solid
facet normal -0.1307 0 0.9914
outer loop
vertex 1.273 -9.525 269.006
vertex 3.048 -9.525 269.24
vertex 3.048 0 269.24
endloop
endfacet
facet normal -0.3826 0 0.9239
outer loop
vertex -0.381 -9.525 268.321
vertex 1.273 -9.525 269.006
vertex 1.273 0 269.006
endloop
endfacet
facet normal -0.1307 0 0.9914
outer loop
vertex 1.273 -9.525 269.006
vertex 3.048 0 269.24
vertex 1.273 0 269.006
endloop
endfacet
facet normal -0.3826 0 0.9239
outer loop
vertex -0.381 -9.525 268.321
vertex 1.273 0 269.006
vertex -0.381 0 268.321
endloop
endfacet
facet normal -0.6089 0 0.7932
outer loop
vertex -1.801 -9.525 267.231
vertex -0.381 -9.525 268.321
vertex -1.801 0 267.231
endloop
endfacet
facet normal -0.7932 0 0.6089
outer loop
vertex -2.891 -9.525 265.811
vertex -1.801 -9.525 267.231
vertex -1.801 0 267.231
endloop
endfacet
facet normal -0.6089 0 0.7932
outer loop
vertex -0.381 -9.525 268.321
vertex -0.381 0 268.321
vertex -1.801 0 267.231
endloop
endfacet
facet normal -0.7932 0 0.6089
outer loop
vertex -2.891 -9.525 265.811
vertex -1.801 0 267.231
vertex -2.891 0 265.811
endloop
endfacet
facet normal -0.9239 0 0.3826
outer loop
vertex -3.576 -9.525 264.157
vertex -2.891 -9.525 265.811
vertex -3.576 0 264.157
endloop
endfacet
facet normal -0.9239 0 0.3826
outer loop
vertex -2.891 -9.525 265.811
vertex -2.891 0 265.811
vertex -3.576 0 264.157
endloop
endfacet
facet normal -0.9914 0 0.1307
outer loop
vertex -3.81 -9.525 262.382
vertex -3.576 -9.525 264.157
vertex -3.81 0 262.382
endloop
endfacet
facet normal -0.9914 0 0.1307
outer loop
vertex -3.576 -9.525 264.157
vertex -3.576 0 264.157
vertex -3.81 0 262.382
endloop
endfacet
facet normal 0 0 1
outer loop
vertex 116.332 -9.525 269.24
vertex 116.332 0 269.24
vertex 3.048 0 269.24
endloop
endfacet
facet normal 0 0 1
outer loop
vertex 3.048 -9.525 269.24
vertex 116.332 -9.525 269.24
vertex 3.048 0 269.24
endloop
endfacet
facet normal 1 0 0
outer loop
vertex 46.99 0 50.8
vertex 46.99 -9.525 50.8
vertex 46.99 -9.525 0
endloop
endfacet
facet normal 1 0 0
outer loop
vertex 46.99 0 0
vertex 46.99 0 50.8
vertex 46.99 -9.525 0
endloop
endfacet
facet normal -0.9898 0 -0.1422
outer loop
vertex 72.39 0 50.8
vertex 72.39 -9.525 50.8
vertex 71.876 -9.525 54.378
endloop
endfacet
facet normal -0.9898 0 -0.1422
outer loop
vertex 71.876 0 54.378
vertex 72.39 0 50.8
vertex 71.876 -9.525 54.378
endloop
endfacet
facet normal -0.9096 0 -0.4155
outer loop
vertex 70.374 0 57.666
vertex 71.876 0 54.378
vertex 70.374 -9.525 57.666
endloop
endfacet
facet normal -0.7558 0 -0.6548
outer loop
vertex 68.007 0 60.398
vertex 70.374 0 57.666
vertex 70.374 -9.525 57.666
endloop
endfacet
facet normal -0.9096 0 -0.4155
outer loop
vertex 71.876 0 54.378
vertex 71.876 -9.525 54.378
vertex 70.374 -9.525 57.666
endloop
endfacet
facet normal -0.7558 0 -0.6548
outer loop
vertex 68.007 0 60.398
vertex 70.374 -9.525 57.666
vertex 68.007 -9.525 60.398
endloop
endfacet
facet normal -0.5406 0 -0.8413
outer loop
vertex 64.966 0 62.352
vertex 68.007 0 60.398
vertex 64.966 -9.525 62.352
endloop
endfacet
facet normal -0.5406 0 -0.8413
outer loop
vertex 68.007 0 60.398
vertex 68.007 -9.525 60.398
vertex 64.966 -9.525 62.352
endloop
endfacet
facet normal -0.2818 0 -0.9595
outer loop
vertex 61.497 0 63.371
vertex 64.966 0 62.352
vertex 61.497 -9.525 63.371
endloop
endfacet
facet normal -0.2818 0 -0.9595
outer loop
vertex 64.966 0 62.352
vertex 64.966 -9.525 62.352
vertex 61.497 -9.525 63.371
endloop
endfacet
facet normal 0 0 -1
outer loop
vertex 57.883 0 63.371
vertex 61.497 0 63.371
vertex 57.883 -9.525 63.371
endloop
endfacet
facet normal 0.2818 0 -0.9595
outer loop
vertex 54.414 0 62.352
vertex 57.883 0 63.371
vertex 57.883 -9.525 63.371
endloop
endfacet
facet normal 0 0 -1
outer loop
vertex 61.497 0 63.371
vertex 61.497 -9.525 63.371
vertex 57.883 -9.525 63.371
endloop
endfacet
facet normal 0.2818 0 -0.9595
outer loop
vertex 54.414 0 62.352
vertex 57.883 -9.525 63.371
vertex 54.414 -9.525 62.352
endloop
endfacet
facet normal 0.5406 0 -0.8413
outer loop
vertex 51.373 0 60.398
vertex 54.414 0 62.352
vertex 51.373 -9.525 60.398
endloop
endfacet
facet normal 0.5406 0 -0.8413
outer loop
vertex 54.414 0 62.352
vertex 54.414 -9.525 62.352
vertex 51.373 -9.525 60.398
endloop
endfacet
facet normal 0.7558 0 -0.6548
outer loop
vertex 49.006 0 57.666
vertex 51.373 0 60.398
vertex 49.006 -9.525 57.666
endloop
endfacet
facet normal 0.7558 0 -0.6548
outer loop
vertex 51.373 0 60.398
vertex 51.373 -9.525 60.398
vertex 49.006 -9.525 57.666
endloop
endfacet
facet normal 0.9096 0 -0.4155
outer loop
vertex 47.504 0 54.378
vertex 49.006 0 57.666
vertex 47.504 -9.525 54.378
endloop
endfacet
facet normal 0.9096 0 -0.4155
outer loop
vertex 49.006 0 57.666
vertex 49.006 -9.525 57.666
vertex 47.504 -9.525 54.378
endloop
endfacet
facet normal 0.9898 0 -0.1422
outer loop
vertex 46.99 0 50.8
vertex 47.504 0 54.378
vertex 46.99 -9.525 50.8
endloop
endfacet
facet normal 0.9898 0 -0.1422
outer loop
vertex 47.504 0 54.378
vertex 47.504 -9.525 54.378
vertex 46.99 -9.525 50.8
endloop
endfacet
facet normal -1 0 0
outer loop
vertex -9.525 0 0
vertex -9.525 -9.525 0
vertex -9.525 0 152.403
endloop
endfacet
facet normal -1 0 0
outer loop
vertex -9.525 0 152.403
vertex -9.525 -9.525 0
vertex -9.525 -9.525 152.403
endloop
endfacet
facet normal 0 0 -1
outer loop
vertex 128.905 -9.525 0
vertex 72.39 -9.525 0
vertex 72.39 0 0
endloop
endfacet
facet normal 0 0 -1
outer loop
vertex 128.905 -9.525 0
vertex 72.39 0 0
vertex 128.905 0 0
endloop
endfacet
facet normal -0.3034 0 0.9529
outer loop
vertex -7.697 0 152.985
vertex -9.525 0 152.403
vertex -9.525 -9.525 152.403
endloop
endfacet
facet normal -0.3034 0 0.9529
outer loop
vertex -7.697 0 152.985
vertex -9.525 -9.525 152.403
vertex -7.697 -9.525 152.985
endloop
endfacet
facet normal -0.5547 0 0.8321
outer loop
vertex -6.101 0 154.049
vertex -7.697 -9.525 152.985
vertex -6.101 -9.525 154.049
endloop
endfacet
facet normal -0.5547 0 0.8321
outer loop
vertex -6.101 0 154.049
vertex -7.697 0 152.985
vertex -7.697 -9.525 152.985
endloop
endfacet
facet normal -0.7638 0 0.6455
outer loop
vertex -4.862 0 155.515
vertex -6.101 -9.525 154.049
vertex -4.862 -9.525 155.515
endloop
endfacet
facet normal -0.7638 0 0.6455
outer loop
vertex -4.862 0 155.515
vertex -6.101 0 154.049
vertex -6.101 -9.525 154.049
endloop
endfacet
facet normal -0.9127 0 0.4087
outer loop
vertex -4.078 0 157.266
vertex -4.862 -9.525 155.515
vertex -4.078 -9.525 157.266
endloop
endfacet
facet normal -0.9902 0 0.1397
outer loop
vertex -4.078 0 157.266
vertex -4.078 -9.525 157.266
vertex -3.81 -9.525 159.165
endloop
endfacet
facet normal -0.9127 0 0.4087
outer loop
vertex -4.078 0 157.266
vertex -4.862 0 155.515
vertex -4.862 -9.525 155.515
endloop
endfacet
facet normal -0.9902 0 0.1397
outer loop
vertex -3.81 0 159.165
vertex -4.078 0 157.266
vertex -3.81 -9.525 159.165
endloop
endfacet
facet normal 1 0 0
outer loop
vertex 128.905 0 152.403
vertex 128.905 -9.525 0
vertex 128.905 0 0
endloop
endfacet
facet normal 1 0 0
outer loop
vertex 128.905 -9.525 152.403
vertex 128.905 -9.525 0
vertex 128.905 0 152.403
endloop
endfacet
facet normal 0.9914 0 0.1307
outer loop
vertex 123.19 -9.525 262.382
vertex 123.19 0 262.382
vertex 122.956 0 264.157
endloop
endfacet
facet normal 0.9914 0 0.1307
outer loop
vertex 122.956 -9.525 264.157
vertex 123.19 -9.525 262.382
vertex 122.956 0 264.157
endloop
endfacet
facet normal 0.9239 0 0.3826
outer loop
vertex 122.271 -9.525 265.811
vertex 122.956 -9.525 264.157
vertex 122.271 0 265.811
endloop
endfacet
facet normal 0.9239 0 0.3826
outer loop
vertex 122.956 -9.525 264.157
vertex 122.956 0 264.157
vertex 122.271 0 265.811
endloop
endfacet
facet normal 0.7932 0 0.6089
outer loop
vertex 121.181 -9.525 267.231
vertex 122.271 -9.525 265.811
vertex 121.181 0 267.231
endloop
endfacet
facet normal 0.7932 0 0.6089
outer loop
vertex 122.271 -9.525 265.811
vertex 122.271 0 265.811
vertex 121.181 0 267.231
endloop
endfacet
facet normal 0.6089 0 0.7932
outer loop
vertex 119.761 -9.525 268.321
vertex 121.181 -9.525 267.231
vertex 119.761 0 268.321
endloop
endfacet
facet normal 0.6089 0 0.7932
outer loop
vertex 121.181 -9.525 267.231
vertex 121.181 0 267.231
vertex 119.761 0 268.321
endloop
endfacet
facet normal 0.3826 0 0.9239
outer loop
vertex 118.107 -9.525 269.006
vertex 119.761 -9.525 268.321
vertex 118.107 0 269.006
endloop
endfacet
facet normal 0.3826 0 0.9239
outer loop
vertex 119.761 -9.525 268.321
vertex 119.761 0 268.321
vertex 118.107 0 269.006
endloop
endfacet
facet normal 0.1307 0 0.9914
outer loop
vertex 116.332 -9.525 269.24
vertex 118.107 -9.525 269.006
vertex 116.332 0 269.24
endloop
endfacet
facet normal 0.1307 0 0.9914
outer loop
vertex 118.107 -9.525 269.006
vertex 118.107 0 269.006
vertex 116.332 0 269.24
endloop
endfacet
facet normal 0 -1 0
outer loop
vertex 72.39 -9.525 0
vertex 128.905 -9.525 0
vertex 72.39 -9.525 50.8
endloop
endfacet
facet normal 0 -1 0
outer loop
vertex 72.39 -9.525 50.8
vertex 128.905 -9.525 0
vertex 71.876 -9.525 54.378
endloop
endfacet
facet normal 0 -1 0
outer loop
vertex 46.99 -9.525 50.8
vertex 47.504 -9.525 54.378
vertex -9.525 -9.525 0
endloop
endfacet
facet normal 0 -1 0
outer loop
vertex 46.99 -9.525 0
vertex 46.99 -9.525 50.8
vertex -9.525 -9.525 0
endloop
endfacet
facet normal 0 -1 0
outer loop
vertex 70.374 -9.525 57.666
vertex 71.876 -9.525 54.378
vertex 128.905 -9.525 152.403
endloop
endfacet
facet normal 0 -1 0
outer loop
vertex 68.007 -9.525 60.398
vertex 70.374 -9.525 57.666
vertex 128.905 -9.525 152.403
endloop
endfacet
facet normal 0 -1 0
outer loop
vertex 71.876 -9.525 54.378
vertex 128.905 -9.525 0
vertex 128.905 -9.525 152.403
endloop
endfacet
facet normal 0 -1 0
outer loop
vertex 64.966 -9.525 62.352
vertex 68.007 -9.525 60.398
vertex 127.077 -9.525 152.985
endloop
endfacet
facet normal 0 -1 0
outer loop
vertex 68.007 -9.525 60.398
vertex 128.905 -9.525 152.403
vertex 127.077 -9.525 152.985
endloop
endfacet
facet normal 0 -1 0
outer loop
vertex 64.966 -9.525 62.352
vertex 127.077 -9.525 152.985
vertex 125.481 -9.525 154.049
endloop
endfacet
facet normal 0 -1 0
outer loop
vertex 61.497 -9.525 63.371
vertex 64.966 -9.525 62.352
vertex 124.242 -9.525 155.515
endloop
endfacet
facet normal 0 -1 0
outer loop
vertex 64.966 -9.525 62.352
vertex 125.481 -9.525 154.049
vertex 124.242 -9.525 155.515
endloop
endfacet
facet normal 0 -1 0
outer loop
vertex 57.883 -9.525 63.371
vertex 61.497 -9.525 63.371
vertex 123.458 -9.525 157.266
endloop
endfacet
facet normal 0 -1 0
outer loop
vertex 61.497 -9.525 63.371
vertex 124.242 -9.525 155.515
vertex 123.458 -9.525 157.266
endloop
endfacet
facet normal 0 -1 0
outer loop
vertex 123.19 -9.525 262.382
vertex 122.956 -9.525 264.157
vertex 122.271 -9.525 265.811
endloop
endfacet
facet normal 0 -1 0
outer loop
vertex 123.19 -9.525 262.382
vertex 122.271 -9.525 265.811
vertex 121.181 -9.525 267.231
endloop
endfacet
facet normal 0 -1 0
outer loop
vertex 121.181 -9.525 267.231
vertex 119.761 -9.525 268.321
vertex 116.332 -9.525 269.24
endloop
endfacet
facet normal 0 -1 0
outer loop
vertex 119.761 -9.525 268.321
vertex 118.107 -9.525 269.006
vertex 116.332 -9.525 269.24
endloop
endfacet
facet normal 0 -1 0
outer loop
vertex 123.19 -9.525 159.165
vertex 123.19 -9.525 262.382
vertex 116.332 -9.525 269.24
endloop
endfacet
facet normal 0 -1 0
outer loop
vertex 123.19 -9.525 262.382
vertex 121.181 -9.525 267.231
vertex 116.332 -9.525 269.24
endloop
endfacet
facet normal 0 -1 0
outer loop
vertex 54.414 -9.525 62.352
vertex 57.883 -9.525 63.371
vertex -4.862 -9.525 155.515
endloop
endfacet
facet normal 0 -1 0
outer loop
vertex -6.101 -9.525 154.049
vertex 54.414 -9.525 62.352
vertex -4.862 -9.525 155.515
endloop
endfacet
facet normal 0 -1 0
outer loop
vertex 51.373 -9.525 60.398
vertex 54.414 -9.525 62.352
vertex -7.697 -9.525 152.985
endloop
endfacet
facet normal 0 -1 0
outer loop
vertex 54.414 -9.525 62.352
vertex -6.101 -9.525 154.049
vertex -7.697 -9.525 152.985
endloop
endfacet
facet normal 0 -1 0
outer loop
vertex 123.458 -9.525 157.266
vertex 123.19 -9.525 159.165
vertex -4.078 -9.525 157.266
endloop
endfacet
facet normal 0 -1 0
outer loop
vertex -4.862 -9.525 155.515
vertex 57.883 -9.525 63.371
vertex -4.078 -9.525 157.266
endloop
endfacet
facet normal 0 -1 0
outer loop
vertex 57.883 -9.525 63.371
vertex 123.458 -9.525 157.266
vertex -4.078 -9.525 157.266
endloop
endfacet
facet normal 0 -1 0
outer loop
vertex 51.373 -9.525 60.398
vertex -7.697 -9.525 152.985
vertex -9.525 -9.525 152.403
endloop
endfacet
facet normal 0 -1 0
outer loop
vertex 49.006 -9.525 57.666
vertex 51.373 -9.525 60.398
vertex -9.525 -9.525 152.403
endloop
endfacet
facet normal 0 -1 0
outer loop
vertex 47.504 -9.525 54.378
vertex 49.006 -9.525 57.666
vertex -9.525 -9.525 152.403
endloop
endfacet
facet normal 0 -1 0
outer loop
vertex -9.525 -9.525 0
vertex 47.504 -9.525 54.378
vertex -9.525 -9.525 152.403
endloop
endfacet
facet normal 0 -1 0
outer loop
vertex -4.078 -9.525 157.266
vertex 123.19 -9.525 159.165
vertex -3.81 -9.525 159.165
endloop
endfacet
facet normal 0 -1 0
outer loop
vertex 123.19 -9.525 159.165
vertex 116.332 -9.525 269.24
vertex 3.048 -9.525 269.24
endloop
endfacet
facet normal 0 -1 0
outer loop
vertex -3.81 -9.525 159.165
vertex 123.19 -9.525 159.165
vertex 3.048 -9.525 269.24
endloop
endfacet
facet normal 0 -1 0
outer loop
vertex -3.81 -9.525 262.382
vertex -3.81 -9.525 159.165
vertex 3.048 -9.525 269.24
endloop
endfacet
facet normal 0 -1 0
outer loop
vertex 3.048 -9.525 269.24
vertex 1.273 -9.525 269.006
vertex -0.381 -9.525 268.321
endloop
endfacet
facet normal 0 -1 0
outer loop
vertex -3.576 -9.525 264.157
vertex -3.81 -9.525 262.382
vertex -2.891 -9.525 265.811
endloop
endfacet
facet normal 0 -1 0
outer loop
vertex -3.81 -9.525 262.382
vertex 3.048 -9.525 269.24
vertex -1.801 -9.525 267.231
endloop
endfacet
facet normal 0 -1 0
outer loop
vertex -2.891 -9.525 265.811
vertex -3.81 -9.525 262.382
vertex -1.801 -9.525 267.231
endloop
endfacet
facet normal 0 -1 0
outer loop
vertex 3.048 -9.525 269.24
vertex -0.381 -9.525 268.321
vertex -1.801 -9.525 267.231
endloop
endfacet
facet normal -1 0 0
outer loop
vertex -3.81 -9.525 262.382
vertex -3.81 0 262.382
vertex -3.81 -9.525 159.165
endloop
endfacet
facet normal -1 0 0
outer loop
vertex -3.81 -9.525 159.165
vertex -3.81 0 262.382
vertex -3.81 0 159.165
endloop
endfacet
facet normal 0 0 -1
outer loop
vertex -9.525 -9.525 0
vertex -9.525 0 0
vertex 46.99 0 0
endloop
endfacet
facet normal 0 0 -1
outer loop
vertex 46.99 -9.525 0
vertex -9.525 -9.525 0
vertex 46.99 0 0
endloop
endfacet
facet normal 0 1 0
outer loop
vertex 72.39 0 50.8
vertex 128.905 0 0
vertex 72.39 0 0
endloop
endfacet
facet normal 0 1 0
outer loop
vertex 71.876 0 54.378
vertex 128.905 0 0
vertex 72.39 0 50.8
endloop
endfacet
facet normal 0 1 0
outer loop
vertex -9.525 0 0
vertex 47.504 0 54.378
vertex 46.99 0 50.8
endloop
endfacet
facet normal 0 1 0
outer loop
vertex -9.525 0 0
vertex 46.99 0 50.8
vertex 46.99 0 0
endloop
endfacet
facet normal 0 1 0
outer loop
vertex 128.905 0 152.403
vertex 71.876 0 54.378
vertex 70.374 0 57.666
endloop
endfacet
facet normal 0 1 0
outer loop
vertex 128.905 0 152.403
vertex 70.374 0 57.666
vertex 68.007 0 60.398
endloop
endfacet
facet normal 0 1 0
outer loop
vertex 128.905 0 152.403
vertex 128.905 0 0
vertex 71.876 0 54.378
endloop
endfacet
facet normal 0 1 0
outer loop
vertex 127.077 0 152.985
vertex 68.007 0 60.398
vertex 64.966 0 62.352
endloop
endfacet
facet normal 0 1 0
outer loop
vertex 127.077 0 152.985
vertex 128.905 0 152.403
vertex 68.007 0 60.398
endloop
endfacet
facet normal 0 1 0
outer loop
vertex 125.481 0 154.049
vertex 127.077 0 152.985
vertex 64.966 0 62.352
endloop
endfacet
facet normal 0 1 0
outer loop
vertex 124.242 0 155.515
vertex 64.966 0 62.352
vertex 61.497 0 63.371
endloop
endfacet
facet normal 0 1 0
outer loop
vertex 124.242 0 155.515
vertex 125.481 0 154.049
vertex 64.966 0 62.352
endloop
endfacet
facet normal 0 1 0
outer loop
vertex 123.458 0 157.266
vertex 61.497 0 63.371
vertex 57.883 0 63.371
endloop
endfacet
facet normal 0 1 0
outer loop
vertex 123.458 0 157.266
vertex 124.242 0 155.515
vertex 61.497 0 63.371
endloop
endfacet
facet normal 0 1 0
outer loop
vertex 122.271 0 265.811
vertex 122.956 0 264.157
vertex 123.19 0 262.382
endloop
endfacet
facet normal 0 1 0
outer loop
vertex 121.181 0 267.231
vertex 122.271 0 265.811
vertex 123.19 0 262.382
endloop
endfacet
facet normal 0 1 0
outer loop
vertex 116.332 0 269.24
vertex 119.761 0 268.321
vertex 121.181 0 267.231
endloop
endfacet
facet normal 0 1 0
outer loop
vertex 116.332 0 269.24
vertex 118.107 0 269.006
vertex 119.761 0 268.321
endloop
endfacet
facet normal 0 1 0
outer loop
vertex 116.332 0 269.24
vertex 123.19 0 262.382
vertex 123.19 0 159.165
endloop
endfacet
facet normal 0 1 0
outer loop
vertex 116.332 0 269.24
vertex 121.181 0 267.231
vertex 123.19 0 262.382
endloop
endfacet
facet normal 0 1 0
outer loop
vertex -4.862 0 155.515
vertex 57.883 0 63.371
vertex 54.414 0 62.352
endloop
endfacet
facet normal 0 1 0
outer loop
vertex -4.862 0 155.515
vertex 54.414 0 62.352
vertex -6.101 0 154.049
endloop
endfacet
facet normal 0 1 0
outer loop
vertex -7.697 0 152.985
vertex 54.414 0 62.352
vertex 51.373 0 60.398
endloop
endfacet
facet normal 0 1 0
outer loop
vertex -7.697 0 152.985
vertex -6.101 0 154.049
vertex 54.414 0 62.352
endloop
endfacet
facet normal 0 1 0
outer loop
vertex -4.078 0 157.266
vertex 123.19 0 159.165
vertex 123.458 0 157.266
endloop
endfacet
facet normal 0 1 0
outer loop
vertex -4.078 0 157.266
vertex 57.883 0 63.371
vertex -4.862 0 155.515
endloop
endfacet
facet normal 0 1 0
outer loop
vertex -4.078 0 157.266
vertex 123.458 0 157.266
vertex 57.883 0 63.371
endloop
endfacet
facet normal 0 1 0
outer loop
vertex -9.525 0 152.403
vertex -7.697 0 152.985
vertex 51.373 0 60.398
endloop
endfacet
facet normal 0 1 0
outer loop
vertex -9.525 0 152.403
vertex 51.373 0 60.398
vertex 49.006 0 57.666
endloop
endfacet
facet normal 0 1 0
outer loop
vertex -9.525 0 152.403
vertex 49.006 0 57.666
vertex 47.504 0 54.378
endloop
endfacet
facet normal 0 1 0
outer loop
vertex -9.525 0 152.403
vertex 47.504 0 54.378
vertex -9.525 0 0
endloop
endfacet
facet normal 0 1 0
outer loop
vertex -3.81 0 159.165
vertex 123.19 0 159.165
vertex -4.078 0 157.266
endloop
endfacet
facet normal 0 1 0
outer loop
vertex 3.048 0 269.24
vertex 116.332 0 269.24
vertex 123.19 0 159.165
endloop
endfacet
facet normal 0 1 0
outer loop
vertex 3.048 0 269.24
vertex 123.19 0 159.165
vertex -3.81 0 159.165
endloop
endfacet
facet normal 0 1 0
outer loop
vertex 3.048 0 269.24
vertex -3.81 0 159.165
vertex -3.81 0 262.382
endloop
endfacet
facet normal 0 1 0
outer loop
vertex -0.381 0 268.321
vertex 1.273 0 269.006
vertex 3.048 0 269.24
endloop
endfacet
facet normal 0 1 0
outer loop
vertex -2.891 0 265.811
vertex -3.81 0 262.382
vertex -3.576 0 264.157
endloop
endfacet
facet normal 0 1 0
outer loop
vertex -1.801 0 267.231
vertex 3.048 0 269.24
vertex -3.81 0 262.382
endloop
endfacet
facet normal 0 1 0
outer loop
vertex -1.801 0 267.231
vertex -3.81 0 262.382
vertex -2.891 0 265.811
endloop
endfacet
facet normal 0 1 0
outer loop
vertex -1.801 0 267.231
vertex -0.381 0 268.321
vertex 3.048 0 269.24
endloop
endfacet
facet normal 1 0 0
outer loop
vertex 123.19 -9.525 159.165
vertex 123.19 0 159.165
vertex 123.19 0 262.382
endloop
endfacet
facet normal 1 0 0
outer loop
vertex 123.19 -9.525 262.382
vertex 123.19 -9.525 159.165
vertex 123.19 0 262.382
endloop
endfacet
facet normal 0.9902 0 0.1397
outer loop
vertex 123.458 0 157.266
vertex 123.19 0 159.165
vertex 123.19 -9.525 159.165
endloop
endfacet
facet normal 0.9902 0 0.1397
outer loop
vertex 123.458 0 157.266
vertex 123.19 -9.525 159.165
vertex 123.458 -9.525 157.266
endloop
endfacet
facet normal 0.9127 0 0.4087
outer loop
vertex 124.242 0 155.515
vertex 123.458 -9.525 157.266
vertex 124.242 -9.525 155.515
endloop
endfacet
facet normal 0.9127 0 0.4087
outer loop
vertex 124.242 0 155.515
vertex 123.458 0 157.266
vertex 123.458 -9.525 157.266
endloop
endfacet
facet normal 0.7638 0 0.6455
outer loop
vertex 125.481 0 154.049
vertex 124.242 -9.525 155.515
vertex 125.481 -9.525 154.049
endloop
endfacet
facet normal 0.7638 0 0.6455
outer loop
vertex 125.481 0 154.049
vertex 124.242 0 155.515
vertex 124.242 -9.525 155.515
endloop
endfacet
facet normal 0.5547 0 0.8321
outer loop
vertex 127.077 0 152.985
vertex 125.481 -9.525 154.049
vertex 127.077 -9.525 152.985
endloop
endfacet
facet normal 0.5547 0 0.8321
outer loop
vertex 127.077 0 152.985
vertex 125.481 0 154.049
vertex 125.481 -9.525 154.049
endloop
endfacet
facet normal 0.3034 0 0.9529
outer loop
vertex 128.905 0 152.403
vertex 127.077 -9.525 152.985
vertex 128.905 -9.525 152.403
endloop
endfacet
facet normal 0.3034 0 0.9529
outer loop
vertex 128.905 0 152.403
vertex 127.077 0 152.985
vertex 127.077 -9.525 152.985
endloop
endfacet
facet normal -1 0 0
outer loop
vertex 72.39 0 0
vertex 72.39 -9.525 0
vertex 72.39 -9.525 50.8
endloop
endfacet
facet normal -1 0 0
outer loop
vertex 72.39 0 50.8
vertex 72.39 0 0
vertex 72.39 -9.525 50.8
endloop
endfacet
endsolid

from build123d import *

# Parameters (mm, degrees)
F1_DEPTH    = 9.525
F3_DEPTH    = 25.4
F4_W        = 9.525
F4_H        = 152.4033595958
F5_DEPTH    = 9.525
F6_T1_DEPTH = 9.525


# Not quite as in the source:
# - a fillet or chamfer that OpenCascade refuses, or shapes differently, is made with other operations: its cross-section is extruded or revolved along the edge and cut away or added


with BuildPart() as f1:
    # F0 (on Front) → F1 (new body)
    with BuildSketch(Plane.XZ):
        with BuildLine():
            Line((0, 152.4033595958), (0, 0))
            Line((0, 0), (119.38, 0))
            Line((119.38, 0), (119.38, 152.4033595958))
            ThreePointArc((119.38, 152.4033595958), (122.160179304, 154.9323166344), (123.19, 158.5468))
            Line((123.19, 158.5468), (123.19, 262.382))
            ThreePointArc((123.19, 262.382), (121.1813383054, 267.2313383054), (116.332, 269.24))
            Line((116.332, 269.24), (3.048, 269.24))
            ThreePointArc((3.048, 269.24), (-1.8013383054, 267.2313383054), (-3.81, 262.382))
            Line((-3.81, 262.382), (-3.81, 158.5468))
            ThreePointArc((-3.81, 158.5468), (-2.780179304, 154.9323166344), (0, 152.4033595958))
        make_face()
    extrude(amount=F1_DEPTH)

    # F2 (on face) → F3 (cut)
    with BuildSketch(Plane.XZ.offset(9.525)):
        with BuildLine():
            Line((46.99, 50.8), (46.99, 0))
            Line((46.99, 0), (72.39, 0))
            Line((72.39, 0), (72.39, 50.8))
            ThreePointArc((72.39, 50.8), (59.69, 63.5), (46.99, 50.8))
        make_face()
    extrude(amount=-F3_DEPTH, mode=Mode.SUBTRACT)

    # F4 (on face) → F5 (join)
    with BuildSketch(Plane.XZ.offset(9.525)):
        with Locations((124.1425, 76.2016797979)):
            Rectangle(F4_W, F4_H)
        with Locations((-4.7625, 76.2016797979)):
            Rectangle(F4_W, F4_H)
    extrude(amount=-F5_DEPTH)

    # F6: fillet of radius 6.858 on 2 edges, made by hand

    # F6_s2 → F6_t1 (join)
    with BuildSketch(Plane.XZ):
        with BuildLine():
            ThreePointArc((123.19, 159.1654387879), (124.8101159807, 154.7386188232), (128.905, 152.4033595958))
            Line((128.905, 152.4033595958), (128.7907, 151.7271516766))
            ThreePointArc((128.7907, 151.7271516766), (124.1425, 151.7175595958), (119.38, 151.7175595958))
            Line((119.38, 151.7175595958), (119.0752, 153.0177036362))
            ThreePointArc((119.0752, 153.0177036362), (122.5042, 158.5468), (122.5042, 159.1654387879))
            Line((122.5042, 159.1654387879), (123.19, 159.1654387879))
        make_face()
        with BuildLine():
            ThreePointArc((-9.525, 152.4033595958), (-5.4301159807, 154.7386188232), (-3.81, 159.1654387879))
            Line((-3.81, 159.1654387879), (-3.1242, 159.1654387879))
            ThreePointArc((-3.1242, 159.1654387879), (-3.1242, 158.5468), (0.3048, 153.0177036362))
            Line((0.3048, 153.0177036362), (0, 151.7175595958))
            ThreePointArc((0, 151.7175595958), (-4.7625, 151.7175595958), (-9.4107, 151.7271516766))
            Line((-9.4107, 151.7271516766), (-9.525, 152.4033595958))
        make_face()
    extrude(amount=F6_T1_DEPTH)


solid = f1.part
